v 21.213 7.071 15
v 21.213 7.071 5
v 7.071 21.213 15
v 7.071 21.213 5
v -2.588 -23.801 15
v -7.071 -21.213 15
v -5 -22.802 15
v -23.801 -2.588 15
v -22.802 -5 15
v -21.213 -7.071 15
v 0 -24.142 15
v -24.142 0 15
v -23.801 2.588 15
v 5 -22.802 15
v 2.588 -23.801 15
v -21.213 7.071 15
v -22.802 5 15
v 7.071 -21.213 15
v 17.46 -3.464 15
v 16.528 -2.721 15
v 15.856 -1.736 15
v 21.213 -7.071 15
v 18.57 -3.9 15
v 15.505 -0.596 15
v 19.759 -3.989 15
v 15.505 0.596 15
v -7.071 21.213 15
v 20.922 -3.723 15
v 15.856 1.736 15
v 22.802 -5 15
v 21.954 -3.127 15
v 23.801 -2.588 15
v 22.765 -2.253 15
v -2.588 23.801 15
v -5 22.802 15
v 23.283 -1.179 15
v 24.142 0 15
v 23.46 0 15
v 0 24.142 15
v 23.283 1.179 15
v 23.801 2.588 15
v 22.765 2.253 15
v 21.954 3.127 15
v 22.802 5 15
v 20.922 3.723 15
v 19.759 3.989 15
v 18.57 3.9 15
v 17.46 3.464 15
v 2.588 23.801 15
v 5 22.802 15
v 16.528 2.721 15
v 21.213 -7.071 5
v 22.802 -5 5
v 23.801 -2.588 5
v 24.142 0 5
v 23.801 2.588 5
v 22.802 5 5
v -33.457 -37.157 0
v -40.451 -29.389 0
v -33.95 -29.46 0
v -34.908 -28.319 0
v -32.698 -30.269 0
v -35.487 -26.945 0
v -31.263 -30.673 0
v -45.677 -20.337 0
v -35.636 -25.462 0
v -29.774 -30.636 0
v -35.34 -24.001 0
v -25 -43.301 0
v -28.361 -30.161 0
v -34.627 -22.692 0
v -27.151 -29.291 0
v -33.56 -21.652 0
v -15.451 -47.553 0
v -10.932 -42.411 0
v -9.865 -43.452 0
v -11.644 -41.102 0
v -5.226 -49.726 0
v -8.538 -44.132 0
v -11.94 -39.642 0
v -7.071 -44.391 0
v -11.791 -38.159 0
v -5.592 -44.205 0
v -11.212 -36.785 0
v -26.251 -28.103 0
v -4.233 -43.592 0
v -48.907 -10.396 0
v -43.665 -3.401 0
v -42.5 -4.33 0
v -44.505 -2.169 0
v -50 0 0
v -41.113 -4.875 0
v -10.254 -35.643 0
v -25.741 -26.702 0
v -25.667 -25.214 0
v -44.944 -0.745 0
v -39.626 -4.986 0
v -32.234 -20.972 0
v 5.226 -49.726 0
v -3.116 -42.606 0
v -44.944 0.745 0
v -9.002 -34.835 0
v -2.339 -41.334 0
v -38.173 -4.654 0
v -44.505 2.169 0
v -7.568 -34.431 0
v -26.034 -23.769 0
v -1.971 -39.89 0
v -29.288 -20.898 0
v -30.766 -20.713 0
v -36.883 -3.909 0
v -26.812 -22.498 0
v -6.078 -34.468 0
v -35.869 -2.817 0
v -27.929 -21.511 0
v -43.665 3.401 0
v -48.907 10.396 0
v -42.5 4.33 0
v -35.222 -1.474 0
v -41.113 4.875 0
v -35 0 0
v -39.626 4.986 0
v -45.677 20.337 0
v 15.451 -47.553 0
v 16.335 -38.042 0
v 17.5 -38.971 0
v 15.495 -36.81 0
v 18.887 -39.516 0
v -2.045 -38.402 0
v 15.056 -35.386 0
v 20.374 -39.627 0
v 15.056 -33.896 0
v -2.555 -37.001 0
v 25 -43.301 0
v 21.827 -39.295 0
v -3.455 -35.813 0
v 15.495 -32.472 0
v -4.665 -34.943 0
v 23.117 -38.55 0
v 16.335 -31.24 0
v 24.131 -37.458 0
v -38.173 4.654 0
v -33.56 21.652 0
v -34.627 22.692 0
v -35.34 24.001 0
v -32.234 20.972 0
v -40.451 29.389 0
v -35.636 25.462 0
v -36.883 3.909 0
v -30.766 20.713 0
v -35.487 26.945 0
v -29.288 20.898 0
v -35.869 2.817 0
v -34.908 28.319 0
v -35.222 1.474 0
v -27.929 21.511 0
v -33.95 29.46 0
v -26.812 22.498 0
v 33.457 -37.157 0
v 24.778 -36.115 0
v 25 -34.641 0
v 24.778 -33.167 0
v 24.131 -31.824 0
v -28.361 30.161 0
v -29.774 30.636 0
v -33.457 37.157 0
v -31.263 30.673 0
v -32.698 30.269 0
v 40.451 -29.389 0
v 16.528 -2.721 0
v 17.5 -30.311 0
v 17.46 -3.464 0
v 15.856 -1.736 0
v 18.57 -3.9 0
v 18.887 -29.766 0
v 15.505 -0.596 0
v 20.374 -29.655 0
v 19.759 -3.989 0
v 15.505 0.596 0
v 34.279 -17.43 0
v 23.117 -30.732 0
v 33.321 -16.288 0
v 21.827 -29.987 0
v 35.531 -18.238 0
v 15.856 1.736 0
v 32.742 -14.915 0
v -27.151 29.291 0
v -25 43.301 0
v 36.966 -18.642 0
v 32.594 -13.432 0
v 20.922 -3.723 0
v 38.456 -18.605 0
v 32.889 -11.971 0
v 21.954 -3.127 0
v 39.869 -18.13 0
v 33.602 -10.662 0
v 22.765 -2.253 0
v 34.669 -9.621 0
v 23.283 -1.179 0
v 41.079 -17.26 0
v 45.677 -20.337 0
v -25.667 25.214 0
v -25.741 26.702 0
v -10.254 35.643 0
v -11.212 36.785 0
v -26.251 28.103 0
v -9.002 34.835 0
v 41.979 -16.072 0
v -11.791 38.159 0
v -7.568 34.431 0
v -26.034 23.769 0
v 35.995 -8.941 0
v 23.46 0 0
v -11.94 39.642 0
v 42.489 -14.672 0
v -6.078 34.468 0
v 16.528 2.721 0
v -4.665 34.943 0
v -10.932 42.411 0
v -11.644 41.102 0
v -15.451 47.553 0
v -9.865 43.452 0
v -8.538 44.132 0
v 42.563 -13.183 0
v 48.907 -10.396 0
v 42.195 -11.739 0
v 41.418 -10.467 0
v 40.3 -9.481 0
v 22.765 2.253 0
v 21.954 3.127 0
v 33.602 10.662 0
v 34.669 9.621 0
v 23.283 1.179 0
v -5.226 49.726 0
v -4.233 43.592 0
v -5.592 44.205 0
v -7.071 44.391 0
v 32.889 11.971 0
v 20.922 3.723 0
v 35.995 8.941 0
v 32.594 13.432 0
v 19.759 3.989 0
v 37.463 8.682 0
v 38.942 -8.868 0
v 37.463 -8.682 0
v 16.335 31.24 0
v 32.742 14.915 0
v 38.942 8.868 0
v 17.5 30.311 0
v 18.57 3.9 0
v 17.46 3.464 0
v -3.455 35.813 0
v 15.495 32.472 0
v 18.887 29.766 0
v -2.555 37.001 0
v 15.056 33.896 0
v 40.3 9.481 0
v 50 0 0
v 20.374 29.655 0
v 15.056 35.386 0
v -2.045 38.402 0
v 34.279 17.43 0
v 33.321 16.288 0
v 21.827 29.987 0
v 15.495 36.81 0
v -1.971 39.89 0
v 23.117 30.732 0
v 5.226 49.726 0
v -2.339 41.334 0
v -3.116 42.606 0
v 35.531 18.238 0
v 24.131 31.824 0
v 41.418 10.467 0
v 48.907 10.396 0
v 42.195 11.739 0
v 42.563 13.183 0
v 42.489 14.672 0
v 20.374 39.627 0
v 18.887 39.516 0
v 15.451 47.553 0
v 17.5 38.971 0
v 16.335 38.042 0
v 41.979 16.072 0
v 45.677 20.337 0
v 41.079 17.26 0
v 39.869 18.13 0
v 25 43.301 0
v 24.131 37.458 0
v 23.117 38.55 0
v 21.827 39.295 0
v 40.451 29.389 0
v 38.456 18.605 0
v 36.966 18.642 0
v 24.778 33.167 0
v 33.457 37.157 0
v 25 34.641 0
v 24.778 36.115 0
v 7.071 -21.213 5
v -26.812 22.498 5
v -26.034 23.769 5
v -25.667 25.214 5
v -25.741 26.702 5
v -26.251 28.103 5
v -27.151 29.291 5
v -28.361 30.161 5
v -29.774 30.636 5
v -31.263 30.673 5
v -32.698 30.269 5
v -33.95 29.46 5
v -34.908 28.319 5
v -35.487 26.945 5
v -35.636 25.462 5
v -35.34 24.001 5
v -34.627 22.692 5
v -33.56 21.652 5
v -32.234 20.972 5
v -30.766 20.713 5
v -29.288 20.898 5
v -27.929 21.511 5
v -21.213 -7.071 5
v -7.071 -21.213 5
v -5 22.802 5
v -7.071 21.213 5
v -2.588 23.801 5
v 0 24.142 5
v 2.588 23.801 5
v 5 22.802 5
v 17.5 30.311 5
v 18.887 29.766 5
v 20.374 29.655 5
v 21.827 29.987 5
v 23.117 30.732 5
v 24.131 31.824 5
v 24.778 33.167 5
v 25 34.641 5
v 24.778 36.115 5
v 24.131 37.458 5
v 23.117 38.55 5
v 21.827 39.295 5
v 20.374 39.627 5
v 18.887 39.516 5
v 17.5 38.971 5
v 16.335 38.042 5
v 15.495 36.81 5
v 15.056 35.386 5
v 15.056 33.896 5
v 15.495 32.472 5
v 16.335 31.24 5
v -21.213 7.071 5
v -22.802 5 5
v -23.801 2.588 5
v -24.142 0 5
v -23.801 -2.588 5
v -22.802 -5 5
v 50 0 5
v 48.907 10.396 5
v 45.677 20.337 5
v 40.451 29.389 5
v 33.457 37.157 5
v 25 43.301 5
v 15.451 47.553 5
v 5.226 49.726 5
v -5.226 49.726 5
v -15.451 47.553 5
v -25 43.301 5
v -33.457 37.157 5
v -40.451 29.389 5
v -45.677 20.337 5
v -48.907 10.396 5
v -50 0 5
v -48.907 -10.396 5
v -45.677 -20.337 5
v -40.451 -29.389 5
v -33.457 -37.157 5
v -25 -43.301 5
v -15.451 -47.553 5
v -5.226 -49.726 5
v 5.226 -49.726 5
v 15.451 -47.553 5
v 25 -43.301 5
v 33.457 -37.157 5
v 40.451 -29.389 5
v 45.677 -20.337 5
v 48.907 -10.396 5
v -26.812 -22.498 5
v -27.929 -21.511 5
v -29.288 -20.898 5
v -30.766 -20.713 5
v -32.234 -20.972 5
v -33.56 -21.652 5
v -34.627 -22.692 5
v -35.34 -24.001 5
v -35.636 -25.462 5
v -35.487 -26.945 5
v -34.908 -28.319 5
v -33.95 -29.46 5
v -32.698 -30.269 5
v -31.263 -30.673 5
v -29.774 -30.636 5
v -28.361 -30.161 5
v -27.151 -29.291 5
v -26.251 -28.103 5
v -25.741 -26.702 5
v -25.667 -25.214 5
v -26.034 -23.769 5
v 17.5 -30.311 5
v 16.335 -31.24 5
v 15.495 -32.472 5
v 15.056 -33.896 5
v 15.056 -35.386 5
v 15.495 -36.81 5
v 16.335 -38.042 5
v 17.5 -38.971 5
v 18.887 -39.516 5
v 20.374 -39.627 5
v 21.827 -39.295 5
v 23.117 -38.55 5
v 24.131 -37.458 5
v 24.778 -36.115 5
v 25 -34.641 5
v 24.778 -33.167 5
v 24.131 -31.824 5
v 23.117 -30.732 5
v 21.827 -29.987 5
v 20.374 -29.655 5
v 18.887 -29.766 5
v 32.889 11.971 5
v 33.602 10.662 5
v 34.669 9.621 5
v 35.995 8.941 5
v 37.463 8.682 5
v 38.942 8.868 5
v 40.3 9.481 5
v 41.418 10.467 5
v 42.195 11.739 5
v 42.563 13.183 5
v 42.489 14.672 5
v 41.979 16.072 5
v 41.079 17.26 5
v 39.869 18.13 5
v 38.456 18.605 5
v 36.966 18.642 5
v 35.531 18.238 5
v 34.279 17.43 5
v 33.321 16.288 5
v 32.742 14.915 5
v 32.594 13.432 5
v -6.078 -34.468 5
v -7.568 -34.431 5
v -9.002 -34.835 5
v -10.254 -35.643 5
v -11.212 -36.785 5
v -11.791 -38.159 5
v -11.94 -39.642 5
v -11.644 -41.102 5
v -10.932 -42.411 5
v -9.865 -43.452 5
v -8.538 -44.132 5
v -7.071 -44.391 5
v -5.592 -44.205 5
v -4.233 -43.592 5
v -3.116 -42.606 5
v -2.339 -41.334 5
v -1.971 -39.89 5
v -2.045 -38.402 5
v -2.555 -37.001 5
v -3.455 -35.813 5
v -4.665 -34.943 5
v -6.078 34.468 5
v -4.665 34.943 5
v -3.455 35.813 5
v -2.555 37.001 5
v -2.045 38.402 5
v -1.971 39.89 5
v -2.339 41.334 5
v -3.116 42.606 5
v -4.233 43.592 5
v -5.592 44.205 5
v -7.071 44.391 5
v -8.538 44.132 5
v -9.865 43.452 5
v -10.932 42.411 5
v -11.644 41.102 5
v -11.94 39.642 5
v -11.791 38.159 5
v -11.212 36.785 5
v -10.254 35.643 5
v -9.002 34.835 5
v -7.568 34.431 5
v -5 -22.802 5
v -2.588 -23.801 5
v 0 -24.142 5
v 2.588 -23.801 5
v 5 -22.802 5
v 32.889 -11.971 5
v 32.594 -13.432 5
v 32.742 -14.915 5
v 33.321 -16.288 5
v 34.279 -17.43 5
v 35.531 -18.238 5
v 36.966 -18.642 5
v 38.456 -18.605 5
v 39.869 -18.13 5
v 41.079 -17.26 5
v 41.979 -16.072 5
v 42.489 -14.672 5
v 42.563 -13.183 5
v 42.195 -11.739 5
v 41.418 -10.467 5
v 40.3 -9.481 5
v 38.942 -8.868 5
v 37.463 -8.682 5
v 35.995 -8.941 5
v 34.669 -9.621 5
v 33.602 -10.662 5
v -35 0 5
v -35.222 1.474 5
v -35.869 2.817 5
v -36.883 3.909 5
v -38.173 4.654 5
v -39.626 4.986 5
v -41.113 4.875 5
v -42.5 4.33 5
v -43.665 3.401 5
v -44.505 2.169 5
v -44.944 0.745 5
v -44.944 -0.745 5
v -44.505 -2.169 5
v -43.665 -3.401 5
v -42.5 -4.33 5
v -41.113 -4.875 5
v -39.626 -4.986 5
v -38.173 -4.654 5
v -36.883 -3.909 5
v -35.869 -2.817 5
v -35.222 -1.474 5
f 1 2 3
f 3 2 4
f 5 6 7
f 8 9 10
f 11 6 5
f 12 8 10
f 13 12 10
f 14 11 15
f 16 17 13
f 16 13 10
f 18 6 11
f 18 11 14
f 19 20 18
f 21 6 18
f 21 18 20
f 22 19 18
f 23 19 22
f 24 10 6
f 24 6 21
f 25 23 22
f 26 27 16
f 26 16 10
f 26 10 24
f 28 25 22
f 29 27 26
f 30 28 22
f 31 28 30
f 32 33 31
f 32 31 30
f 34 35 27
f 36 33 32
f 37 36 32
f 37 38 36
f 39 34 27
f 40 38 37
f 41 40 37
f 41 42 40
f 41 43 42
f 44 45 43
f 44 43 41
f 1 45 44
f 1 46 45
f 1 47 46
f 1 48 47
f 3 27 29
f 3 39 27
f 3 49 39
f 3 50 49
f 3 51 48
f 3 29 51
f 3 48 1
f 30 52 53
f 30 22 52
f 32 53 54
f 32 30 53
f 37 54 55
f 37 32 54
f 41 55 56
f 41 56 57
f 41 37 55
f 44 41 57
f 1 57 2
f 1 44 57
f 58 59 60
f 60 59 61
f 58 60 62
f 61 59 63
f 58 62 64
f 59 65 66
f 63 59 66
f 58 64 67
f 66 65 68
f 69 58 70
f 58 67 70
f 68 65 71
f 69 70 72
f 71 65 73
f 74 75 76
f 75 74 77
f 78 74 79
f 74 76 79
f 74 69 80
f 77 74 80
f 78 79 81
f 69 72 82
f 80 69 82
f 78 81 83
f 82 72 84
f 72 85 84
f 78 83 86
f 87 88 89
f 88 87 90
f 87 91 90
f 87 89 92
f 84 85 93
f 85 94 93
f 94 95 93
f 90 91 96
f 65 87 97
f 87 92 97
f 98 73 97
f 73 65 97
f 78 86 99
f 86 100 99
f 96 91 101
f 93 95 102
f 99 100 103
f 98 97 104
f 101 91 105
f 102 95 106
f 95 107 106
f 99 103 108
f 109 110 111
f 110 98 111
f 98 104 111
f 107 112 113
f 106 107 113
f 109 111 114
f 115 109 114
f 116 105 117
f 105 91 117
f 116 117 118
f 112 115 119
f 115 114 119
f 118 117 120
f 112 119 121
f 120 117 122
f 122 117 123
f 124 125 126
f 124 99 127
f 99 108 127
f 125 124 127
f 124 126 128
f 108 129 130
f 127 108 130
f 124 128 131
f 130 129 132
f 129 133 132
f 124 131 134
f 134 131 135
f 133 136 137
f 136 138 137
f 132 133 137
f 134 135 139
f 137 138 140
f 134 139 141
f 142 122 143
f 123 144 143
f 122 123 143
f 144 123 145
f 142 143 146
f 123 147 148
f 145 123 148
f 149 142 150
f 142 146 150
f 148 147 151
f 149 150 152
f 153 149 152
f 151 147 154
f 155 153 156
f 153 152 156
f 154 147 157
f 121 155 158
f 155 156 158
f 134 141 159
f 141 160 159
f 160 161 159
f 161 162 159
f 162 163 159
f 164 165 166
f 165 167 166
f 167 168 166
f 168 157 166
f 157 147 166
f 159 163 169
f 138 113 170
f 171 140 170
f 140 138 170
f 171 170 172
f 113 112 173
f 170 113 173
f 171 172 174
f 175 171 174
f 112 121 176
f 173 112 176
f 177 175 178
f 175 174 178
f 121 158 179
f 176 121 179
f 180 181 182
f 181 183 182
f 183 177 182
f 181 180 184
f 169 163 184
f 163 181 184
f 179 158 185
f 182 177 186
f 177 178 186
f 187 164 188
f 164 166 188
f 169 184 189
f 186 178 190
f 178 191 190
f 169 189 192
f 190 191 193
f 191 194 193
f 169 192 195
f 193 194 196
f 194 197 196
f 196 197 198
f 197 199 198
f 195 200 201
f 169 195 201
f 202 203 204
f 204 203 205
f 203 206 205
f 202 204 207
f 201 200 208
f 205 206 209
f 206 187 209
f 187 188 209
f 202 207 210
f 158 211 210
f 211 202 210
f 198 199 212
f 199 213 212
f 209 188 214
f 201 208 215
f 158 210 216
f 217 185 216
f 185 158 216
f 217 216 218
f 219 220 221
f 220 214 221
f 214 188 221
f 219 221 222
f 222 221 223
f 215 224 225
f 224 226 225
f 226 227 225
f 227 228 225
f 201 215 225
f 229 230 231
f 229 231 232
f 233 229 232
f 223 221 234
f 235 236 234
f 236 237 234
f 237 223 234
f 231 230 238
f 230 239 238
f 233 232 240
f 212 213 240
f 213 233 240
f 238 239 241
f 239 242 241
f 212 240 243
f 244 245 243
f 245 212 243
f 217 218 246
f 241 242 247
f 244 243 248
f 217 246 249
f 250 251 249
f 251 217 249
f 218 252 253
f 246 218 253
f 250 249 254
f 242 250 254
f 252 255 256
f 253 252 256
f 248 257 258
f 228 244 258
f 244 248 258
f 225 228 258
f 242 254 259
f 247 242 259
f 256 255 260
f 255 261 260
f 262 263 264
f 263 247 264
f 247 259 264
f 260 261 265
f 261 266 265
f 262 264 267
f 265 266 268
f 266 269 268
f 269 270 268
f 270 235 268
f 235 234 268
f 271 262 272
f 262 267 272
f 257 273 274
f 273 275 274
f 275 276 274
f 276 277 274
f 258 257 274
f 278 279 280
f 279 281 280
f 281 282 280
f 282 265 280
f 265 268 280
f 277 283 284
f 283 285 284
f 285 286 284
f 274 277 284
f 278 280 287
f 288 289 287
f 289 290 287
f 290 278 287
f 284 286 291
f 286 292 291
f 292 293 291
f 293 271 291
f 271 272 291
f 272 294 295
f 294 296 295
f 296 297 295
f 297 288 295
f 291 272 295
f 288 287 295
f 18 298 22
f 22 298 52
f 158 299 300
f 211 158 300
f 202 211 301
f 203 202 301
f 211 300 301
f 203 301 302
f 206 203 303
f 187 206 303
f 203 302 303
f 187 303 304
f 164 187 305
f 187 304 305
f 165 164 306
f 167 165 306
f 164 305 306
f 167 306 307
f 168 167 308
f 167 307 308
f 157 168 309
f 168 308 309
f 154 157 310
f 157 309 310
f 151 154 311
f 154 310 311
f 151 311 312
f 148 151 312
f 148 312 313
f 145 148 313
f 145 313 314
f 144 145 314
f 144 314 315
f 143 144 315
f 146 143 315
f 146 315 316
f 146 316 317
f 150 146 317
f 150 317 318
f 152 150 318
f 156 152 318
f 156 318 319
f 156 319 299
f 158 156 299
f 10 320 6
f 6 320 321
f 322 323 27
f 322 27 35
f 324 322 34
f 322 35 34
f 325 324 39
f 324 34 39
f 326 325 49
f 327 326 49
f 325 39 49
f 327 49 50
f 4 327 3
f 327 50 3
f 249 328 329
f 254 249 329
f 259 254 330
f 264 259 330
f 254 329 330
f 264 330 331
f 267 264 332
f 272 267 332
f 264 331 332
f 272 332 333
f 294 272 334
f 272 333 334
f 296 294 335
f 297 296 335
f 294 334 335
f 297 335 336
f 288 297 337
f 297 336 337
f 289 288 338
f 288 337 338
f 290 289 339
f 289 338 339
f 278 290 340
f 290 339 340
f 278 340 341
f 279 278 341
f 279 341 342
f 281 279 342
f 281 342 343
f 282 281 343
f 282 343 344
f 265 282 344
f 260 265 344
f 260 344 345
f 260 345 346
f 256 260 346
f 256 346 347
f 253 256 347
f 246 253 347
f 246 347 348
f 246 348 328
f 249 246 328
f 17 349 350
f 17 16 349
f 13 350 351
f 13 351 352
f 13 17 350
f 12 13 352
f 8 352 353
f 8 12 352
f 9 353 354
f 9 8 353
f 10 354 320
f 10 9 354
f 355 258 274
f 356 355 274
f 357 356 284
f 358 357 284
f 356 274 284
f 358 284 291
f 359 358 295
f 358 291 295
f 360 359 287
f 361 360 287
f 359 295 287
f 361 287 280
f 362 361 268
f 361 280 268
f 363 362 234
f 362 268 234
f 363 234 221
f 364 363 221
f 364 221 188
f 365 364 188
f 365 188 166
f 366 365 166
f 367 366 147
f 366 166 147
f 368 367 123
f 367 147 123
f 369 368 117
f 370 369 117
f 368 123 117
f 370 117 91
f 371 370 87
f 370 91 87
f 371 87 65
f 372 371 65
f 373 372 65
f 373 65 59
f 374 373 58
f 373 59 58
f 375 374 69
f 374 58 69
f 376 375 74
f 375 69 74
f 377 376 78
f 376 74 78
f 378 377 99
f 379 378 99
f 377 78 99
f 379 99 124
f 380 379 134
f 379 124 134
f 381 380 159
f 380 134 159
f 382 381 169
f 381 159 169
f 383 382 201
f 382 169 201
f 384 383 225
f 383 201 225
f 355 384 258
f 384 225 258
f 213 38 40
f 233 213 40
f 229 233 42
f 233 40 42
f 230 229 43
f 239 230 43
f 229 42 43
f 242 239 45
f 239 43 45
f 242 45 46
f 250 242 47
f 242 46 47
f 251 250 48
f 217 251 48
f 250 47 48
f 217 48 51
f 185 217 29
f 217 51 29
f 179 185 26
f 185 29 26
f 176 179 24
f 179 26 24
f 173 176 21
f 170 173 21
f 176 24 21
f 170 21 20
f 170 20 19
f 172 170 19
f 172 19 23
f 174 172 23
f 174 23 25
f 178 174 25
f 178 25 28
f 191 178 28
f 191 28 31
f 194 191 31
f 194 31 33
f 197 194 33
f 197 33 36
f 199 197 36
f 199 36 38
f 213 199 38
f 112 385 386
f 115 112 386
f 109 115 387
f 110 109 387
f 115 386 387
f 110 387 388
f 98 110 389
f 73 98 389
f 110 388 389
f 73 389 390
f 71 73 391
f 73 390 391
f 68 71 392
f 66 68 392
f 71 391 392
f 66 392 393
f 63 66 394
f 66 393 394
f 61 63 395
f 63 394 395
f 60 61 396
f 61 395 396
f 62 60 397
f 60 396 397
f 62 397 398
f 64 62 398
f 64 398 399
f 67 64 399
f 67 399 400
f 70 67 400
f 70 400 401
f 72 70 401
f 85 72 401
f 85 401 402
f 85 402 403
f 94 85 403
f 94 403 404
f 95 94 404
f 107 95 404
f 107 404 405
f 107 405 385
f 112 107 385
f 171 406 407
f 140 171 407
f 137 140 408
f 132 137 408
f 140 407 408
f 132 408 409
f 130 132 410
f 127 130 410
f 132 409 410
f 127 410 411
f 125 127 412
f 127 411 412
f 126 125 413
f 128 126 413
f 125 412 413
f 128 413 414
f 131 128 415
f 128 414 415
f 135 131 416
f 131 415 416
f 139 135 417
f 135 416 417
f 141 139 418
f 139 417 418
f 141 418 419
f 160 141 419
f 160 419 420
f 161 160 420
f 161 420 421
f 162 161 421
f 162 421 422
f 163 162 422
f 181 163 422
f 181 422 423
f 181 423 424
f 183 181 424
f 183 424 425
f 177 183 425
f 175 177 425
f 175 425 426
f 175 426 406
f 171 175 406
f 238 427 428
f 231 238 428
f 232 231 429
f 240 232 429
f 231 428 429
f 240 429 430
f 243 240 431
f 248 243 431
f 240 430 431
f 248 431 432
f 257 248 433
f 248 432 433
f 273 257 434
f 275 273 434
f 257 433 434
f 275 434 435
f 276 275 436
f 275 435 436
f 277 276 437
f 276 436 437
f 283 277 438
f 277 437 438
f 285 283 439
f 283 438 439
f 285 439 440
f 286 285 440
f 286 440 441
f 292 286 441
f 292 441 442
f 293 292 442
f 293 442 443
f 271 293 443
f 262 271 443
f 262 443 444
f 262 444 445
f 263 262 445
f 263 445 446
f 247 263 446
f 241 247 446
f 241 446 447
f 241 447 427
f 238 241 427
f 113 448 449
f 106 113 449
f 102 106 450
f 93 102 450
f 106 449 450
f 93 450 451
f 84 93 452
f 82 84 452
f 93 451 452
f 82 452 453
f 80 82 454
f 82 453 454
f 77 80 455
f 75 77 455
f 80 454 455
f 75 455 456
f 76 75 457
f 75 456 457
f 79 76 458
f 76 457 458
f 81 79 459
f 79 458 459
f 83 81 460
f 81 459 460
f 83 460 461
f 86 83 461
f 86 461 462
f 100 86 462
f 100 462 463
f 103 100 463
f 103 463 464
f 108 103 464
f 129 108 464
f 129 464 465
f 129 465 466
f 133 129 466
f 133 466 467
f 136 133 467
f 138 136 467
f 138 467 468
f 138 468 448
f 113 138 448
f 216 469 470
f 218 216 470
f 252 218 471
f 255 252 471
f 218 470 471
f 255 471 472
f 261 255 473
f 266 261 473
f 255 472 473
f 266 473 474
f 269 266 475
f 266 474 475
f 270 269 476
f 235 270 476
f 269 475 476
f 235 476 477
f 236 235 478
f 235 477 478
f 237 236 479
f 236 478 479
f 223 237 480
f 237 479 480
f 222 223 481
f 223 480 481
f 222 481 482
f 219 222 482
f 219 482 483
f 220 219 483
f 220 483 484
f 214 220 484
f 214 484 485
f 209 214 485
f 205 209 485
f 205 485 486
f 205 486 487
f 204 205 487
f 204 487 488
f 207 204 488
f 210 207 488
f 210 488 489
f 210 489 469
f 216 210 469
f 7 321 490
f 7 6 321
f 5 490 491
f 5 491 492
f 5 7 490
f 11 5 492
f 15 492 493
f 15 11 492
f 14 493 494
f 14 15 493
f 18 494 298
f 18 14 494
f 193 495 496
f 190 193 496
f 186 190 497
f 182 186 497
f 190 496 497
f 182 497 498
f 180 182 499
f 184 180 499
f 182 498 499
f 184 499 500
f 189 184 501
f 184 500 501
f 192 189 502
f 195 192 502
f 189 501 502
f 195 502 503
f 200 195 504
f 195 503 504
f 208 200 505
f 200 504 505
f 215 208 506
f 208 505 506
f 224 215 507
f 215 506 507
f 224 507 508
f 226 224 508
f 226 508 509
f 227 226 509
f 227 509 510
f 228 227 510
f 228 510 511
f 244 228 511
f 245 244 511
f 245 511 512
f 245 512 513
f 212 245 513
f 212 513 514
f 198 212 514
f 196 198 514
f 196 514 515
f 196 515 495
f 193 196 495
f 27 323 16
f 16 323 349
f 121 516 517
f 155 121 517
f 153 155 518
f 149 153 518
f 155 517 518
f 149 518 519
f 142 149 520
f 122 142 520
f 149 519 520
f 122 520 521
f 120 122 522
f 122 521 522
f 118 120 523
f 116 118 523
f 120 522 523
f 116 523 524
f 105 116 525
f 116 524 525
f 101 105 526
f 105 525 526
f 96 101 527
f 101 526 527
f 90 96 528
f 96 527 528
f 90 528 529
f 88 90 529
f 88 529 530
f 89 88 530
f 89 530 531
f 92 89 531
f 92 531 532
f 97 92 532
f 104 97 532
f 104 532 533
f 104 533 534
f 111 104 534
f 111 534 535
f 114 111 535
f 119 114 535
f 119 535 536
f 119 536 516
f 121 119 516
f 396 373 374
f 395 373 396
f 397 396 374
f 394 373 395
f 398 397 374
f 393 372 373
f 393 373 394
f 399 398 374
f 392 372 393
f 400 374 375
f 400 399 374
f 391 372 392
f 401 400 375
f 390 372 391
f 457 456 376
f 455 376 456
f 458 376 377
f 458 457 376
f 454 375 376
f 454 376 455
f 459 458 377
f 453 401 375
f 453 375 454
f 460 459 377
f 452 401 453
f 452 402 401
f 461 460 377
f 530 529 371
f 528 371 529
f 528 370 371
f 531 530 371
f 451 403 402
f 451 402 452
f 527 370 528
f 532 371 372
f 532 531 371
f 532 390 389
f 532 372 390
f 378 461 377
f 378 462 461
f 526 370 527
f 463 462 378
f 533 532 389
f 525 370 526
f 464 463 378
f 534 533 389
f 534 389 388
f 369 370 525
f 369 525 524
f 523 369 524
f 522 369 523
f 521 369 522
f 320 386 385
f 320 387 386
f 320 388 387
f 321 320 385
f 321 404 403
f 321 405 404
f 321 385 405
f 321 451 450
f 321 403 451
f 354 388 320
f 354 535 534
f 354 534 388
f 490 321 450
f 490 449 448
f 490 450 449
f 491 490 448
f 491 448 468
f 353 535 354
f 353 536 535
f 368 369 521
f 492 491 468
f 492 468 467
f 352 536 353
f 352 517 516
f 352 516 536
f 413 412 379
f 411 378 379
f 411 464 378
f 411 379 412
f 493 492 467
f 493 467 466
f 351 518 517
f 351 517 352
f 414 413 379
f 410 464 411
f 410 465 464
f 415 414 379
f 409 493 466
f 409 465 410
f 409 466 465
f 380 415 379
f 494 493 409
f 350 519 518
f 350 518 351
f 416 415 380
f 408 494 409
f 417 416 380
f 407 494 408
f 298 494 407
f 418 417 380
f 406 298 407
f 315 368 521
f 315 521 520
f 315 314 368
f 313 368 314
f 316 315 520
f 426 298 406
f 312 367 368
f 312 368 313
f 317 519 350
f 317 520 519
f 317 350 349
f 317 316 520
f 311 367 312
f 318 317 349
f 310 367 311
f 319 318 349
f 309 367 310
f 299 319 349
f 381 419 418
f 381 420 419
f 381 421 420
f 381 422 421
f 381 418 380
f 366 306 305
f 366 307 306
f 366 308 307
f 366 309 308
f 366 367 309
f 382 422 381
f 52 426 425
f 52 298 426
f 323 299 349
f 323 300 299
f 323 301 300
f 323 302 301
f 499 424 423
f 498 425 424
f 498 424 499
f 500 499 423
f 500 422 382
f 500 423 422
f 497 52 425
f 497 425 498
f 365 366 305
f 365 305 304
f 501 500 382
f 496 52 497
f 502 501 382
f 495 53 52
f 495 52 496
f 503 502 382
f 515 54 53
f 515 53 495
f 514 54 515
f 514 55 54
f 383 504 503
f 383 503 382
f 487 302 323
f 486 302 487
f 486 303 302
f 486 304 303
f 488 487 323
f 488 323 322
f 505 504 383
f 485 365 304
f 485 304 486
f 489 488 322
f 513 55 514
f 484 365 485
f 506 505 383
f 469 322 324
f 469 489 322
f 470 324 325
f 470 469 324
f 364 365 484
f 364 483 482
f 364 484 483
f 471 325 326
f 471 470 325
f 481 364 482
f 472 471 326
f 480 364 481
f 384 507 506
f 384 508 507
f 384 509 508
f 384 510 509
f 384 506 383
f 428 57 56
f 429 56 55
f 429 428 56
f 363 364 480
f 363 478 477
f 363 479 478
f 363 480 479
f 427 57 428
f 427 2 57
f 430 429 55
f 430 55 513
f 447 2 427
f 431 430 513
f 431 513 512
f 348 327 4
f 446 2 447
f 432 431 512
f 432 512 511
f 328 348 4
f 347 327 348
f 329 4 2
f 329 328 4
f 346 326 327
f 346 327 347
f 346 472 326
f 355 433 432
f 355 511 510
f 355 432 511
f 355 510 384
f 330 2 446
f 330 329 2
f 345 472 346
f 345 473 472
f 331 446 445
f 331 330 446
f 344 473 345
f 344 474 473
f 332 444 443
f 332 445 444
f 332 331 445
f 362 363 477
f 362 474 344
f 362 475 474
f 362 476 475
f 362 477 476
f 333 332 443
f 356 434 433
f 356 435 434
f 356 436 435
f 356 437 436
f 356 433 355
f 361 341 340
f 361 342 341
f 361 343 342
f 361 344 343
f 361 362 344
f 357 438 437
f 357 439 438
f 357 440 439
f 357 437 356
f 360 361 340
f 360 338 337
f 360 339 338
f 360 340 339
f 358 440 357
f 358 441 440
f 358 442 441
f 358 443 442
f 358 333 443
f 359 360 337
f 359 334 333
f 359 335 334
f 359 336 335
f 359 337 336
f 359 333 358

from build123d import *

# Parameters (mm, degrees)
SKICA1_R                 = 50
VYSUNOUT1_DEPTH          = 5
SKICA3_R                 = 5
ODEBRAT_VYSUNUT_M1_DEPTH = 6
KRUHOV_POLE1_COUNT       = 9
VYSUNOUT2_DEPTH          = 10
ZAOBLIT2_R               = 10
ODEBRAT_VYSUNUT_M2_REACH = 17
SKICA5_R                 = 4


with BuildPart() as part:
    # Skica1 → Vysunout1 (new body)
    with BuildSketch(Plane.XY):
        Circle(SKICA1_R)
    extrude(amount=VYSUNOUT1_DEPTH)

    # Skica3 → Odebrat vysunutím1 (cut, through all)
    with BuildSketch(Plane.XY.offset(5)):
        with Locations((-40, 0)):
            Circle(SKICA3_R)
    odebrat_vysunut_m1 = extrude(amount=-ODEBRAT_VYSUNUT_M1_DEPTH, mode=Mode.SUBTRACT)

    # Kruhové pole1: Odebrat vysunutím1 ×9 about axis
    kruhov_pole1_axis = Axis((0, 0, 0), (0, 0, 1))
    for i in range(1, KRUHOV_POLE1_COUNT):
        add(odebrat_vysunut_m1.rotate(kruhov_pole1_axis, i * 360 / KRUHOV_POLE1_COUNT), mode=Mode.SUBTRACT)

    # Skica2 → Vysunout2 (add)
    with BuildSketch(Plane.XY.offset(5)):
        Polygon((0, 28.284271247), (-28.284271247, 0), (0, -28.284271247), (28.284271247, 0), align=None)
    extrude(amount=VYSUNOUT2_DEPTH)

    # Zaoblit2
    zaoblit2_edges = [part.edges().sort_by_distance(p)[0] for p in [
        (-28.284271247, 0, 10),
        (0, -28.284271247, 10),
        (28.284271247, 0, 10),
        (0, 28.284271247, 10),
    ]]
    fillet(zaoblit2_edges, radius=ZAOBLIT2_R)

    # Skica5 → Odebrat vysunutím2 (cut, up to next)
    with BuildSketch(Plane.XY.offset(15), mode=Mode.PRIVATE) as odebrat_vysunut_m2_sk1:
        with Locations((19.460353897, 0)):
            Circle(SKICA5_R)
    odebrat_vysunut_m2_tool1 = extrude(odebrat_vysunut_m2_sk1.sketch, amount=-ODEBRAT_VYSUNUT_M2_REACH, mode=Mode.PRIVATE) & part.part
    add(odebrat_vysunut_m2_tool1.solids().sort_by_distance((19.460354, 0, 15))[0], mode=Mode.SUBTRACT)


solid = part.part
